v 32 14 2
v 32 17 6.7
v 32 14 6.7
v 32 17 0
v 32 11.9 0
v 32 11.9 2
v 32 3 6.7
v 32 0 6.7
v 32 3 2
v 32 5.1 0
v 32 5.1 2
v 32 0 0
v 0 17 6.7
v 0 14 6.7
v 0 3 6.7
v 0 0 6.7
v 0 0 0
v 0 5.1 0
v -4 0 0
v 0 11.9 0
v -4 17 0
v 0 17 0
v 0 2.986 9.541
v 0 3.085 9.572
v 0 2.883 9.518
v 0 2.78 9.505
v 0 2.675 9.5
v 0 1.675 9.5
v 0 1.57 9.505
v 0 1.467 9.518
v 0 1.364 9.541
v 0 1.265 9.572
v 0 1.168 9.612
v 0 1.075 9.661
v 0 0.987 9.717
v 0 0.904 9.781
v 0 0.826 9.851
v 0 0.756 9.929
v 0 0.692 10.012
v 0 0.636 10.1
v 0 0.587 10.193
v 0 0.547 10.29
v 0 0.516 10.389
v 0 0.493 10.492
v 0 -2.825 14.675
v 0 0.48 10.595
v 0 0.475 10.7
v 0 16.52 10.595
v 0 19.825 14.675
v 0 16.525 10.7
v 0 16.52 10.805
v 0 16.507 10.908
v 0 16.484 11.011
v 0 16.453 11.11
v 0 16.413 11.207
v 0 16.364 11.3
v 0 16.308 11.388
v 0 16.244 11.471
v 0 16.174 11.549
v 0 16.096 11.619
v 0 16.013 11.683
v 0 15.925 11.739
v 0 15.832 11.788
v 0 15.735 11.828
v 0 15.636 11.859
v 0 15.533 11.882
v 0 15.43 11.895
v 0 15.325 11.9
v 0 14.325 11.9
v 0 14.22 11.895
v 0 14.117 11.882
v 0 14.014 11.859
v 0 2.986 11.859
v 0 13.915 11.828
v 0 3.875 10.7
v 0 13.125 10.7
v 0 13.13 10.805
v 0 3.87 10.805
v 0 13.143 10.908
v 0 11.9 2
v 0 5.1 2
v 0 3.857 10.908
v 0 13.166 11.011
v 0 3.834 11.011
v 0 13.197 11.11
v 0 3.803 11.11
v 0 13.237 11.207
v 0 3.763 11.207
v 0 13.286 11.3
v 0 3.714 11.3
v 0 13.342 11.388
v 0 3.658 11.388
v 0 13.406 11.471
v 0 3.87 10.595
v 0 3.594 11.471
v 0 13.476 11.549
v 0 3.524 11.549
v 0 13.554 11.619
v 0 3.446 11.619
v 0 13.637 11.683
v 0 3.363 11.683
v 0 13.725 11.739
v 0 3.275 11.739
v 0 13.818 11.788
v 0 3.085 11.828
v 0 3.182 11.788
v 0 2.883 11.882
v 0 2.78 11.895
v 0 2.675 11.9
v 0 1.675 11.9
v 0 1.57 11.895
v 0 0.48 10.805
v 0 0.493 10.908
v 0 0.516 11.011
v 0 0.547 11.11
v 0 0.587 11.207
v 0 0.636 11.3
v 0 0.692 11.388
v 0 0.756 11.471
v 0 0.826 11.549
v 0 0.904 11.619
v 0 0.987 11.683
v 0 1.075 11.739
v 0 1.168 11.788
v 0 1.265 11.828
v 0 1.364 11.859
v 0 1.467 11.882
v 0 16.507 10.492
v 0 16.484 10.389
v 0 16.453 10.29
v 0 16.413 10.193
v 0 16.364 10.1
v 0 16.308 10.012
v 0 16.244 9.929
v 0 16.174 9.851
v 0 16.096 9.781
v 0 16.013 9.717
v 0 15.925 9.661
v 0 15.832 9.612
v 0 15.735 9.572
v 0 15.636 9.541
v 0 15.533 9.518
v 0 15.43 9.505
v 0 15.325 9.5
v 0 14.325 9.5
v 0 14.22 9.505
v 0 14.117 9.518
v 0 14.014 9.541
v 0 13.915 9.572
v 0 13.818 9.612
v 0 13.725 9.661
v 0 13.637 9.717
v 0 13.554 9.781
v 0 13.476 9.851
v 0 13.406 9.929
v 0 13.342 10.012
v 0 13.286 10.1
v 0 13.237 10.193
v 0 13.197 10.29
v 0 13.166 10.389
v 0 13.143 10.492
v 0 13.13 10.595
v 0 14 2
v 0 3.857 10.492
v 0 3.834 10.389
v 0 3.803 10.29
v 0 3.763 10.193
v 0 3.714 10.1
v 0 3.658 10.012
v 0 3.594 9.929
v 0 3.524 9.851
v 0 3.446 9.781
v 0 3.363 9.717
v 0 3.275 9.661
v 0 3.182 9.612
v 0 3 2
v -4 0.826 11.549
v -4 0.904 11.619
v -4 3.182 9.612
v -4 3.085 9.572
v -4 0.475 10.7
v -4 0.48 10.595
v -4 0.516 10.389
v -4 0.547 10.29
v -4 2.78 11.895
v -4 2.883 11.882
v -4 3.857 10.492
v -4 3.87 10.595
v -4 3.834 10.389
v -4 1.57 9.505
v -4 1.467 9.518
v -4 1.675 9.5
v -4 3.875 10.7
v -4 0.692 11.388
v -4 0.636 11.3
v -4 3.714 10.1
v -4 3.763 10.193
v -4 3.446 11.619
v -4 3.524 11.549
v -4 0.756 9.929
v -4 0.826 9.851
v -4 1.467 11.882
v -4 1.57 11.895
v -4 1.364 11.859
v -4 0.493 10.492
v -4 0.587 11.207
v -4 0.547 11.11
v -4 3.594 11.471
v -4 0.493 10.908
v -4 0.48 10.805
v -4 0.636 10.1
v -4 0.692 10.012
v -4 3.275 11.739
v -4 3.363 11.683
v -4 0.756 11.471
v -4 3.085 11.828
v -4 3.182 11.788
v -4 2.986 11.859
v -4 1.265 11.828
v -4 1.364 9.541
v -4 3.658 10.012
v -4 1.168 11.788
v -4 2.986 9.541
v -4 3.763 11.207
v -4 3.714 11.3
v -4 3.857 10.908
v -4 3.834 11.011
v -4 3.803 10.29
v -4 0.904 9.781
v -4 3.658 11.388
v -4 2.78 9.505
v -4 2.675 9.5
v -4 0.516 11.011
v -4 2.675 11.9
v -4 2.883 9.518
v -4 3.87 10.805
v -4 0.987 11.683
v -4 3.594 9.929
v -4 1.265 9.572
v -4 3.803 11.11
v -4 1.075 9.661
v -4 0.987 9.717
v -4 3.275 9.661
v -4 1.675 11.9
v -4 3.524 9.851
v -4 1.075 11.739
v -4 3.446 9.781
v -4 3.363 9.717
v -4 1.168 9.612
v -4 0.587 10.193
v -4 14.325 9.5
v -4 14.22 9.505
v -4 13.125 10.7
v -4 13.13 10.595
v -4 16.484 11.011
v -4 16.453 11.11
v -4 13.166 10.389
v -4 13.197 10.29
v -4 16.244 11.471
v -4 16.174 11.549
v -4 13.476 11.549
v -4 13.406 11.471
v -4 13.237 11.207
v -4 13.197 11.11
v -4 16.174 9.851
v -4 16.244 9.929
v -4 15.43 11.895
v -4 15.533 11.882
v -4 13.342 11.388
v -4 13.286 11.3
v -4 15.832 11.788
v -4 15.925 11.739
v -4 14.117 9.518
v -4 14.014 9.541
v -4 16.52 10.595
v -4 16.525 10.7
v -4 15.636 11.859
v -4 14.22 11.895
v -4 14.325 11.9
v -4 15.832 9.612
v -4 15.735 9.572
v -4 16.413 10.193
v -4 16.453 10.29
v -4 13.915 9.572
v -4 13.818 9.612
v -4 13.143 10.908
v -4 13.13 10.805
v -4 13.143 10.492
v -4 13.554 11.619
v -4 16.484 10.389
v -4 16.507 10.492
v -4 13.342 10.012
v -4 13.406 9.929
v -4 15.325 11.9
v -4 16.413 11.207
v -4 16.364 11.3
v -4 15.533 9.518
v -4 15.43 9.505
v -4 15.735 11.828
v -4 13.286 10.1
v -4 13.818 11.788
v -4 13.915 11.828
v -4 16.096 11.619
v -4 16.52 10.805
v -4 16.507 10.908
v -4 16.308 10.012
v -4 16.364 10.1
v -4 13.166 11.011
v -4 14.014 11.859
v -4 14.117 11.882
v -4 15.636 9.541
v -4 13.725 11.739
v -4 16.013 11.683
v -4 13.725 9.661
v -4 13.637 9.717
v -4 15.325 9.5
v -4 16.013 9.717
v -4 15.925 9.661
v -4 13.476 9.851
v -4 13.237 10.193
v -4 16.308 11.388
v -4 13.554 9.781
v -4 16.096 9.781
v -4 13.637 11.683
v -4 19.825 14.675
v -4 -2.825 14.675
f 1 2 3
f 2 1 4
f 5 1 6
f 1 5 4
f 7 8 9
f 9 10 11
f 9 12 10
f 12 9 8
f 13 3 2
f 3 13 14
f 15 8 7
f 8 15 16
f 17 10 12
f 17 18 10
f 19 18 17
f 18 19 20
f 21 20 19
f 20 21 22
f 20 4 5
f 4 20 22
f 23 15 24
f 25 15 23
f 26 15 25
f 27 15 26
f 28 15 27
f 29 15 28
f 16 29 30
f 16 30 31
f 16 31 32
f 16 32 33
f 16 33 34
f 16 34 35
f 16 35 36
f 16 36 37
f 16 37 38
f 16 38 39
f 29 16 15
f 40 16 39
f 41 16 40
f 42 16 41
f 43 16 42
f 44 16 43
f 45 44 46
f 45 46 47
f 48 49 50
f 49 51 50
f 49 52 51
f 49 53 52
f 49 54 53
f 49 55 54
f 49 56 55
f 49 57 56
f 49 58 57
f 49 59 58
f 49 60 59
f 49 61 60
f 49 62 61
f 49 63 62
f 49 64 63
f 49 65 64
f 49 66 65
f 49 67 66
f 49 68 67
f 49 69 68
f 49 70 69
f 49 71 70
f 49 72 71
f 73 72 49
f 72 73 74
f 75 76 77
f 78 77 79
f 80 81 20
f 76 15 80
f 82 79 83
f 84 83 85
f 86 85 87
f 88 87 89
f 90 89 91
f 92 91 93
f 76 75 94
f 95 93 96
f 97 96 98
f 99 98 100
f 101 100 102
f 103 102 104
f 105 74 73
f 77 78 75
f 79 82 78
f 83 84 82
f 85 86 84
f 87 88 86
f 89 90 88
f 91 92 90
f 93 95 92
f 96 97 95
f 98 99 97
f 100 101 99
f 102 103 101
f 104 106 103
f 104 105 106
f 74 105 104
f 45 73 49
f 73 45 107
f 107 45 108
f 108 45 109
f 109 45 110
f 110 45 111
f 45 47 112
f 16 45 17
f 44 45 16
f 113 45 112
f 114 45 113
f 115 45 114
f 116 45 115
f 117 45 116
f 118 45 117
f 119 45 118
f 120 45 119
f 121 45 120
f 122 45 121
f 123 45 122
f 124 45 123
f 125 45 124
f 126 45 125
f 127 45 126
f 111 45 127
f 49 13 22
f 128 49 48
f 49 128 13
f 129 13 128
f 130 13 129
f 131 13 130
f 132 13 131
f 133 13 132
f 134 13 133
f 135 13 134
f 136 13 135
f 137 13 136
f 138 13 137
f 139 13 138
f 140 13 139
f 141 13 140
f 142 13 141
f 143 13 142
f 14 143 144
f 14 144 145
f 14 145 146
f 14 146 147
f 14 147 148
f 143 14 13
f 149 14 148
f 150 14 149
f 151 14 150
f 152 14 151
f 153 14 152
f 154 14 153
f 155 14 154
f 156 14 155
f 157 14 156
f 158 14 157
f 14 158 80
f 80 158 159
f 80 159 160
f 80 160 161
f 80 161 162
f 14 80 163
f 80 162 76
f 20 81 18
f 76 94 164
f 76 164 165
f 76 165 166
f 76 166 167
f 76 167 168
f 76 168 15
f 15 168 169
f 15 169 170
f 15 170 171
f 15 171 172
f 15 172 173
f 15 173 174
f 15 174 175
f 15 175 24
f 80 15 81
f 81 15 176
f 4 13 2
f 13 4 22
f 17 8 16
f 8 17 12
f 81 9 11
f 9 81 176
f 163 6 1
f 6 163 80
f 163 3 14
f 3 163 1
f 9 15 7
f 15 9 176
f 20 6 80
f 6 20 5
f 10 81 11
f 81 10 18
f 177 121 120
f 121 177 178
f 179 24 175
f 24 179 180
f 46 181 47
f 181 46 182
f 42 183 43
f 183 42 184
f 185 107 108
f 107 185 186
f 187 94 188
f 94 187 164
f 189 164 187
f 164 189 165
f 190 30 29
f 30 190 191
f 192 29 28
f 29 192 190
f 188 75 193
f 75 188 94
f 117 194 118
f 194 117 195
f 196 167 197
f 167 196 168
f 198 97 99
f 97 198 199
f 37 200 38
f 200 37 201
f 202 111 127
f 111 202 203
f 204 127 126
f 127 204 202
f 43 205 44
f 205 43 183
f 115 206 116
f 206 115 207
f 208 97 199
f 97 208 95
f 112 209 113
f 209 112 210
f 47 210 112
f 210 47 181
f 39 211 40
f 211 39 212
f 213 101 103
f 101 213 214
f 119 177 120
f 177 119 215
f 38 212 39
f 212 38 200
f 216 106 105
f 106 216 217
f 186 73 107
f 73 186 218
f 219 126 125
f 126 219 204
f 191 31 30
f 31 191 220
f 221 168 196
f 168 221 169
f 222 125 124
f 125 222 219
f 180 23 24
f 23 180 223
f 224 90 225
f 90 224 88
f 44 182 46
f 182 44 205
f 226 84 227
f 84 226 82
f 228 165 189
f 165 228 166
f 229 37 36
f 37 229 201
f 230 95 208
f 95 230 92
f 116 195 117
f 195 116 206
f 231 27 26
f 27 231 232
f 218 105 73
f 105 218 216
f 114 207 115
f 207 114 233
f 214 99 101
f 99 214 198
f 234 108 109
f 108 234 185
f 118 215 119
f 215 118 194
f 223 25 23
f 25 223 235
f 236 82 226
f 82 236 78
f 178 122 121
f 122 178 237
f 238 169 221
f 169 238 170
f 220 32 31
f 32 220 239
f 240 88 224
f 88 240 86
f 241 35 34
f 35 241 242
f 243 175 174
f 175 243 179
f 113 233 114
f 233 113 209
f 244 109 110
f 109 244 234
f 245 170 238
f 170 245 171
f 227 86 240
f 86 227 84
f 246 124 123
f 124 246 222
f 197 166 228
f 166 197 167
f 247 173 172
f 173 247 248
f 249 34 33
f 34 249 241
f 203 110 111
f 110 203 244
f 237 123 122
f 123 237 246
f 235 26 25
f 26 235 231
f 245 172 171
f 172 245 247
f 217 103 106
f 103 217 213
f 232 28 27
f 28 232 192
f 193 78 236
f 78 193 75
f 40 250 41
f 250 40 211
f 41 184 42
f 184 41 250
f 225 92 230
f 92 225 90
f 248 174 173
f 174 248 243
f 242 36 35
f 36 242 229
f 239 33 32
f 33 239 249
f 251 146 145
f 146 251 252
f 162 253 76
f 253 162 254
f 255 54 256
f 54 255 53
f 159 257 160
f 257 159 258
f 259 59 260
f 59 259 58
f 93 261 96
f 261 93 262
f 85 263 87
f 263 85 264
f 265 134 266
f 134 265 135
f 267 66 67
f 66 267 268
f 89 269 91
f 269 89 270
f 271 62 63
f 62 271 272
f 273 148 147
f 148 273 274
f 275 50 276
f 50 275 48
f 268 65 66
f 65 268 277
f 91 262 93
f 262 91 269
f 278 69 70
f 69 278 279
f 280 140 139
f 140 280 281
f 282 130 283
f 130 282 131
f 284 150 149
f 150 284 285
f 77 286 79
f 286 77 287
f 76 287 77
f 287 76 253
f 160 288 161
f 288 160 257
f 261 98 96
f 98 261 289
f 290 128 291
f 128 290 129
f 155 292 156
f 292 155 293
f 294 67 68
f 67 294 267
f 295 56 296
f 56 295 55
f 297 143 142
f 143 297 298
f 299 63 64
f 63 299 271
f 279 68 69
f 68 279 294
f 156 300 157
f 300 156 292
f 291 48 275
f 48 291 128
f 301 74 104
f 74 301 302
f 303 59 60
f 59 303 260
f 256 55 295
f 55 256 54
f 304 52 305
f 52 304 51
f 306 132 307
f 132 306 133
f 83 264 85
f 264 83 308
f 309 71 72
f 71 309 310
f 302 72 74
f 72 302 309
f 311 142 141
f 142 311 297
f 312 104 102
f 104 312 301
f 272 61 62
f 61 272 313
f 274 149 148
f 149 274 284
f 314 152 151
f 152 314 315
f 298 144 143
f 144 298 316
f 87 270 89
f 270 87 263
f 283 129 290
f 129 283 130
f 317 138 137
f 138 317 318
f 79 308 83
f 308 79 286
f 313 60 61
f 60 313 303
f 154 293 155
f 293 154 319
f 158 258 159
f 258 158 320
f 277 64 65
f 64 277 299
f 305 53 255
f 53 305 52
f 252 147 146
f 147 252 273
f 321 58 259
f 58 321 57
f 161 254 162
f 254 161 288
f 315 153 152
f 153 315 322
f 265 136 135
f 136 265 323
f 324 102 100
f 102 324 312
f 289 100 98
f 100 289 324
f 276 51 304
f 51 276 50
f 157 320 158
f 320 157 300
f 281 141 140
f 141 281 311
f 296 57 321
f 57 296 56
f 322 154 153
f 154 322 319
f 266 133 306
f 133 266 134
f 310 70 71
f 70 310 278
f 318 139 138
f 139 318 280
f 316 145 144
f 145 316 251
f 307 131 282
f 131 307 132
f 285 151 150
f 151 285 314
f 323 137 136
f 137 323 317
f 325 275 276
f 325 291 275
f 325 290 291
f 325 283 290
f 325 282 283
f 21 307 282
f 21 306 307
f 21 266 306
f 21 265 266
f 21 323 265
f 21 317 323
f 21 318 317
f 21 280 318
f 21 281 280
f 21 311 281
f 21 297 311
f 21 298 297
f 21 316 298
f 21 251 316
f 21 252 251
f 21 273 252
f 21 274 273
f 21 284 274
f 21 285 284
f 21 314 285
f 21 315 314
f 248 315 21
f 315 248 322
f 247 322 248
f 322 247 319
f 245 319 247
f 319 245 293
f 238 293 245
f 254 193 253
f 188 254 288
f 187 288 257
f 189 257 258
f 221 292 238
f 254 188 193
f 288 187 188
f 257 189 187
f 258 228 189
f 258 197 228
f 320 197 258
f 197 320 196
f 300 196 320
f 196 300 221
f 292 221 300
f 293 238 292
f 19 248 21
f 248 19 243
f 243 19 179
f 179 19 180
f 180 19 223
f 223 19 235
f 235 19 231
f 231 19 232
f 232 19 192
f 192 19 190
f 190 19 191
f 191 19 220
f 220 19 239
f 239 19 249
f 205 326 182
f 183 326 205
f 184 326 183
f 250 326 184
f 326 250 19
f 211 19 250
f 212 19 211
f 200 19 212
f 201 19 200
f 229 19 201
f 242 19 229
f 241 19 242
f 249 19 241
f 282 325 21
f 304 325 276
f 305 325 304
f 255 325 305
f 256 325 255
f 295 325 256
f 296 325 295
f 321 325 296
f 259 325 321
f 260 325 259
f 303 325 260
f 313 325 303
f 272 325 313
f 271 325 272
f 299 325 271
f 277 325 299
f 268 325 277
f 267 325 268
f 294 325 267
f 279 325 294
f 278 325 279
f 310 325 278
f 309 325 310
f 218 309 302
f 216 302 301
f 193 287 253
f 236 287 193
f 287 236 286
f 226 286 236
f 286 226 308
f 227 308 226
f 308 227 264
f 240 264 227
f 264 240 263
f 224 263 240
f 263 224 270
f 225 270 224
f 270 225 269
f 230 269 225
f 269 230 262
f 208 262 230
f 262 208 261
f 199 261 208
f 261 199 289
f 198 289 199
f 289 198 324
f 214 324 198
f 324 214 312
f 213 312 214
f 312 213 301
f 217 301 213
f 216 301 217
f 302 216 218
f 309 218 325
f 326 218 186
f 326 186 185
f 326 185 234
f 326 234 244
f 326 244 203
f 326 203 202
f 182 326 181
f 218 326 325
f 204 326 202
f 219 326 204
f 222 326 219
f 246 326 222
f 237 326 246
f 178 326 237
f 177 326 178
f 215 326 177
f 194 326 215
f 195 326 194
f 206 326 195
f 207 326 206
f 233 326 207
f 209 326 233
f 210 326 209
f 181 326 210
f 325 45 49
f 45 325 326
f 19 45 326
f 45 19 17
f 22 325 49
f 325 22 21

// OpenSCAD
Gap = 0.2;
$fn = 72;

FrameToSensor();

module FrameToSensor() {
    Padding = 3.0;

    HeadDiameter = 11.0;
    HeadHeight = 4.5 + Gap;

    ThreadDiameter = 6.6 + Gap; // I measured 6.2, but RodToBearingCoupling uses 6.5 for a snug fit
    ThreadHeight = 2.0;

    FrameAdapterWidth = HeadDiameter + 2*Padding;
    FrameAdapterLength = 32;
    FrameAdapterHeight = ThreadHeight + HeadHeight;

    MotorRadius = 26.0;
    BearingAdapterOffset = MotorRadius + FrameAdapterHeight;
    BearingAdapterShift = 0;

    MountRadius = 1.0; // it's a 2mm screw
    MountDistance = 12.65;
    MountOffsetFromCenter = MountDistance / 2;
    MountHeight = FrameAdapterHeight + MountRadius + Padding; // As low as possible

    Width = MountDistance + (MountRadius*2 + Padding)*2;
    Depth = 4; // arbitrary
    Height = Width + FrameAdapterHeight;
    ToTheSky = 50;

    union() {
        // Frame adapter
        difference() {
            cube([FrameAdapterLength, FrameAdapterWidth, FrameAdapterHeight]);

            // Volume of the nut head
            translate([0, Padding, ThreadHeight])
                cube([FrameAdapterLength + Gap, HeadDiameter, HeadHeight]);

            // Volume of the nut thread
            translate([0, Padding + (HeadDiameter - ThreadDiameter)/2, 0])
                cube([FrameAdapterLength + Gap, ThreadDiameter, ThreadHeight]);
        }

        // Sensor adapter
        rotate([0, -90, 0])
        translate([0, FrameAdapterWidth/2, Depth/2])
        difference() {
            union()
            {
                // Connection to frame adapter
                linear_extrude(height = Depth, center = true)
                    polygon(points = [
                    [0, -FrameAdapterWidth/2],
                    [Height/2, -Width/2],
                    [Height/2, Width/2],
                    [0, FrameAdapterWidth/2],
                    ]);
            }
            union() {
                // Volume of mount 1
                translate([MountHeight, -MountOffsetFromCenter, 0])
                hull()
                {
                    translate([0, -MountRadius/2, 0])
                        cylinder(r = MountRadius + Gap, h=ToTheSky, center=true);
                    translate([0, MountRadius/2, 0])
                        cylinder(r = MountRadius + Gap, h=ToTheSky, center=true);
                }

                // Volume of mount 2
                translate([MountHeight, MountOffsetFromCenter, 0])
                hull()
                {
                    translate([0, -MountRadius/2, 0])
                        cylinder(r = MountRadius + Gap, h=ToTheSky, center=true);
                    translate([0, MountRadius/2, 0])
                        cylinder(r = MountRadius + Gap, h=ToTheSky, center=true);
                }
            }
        }
    }
}
